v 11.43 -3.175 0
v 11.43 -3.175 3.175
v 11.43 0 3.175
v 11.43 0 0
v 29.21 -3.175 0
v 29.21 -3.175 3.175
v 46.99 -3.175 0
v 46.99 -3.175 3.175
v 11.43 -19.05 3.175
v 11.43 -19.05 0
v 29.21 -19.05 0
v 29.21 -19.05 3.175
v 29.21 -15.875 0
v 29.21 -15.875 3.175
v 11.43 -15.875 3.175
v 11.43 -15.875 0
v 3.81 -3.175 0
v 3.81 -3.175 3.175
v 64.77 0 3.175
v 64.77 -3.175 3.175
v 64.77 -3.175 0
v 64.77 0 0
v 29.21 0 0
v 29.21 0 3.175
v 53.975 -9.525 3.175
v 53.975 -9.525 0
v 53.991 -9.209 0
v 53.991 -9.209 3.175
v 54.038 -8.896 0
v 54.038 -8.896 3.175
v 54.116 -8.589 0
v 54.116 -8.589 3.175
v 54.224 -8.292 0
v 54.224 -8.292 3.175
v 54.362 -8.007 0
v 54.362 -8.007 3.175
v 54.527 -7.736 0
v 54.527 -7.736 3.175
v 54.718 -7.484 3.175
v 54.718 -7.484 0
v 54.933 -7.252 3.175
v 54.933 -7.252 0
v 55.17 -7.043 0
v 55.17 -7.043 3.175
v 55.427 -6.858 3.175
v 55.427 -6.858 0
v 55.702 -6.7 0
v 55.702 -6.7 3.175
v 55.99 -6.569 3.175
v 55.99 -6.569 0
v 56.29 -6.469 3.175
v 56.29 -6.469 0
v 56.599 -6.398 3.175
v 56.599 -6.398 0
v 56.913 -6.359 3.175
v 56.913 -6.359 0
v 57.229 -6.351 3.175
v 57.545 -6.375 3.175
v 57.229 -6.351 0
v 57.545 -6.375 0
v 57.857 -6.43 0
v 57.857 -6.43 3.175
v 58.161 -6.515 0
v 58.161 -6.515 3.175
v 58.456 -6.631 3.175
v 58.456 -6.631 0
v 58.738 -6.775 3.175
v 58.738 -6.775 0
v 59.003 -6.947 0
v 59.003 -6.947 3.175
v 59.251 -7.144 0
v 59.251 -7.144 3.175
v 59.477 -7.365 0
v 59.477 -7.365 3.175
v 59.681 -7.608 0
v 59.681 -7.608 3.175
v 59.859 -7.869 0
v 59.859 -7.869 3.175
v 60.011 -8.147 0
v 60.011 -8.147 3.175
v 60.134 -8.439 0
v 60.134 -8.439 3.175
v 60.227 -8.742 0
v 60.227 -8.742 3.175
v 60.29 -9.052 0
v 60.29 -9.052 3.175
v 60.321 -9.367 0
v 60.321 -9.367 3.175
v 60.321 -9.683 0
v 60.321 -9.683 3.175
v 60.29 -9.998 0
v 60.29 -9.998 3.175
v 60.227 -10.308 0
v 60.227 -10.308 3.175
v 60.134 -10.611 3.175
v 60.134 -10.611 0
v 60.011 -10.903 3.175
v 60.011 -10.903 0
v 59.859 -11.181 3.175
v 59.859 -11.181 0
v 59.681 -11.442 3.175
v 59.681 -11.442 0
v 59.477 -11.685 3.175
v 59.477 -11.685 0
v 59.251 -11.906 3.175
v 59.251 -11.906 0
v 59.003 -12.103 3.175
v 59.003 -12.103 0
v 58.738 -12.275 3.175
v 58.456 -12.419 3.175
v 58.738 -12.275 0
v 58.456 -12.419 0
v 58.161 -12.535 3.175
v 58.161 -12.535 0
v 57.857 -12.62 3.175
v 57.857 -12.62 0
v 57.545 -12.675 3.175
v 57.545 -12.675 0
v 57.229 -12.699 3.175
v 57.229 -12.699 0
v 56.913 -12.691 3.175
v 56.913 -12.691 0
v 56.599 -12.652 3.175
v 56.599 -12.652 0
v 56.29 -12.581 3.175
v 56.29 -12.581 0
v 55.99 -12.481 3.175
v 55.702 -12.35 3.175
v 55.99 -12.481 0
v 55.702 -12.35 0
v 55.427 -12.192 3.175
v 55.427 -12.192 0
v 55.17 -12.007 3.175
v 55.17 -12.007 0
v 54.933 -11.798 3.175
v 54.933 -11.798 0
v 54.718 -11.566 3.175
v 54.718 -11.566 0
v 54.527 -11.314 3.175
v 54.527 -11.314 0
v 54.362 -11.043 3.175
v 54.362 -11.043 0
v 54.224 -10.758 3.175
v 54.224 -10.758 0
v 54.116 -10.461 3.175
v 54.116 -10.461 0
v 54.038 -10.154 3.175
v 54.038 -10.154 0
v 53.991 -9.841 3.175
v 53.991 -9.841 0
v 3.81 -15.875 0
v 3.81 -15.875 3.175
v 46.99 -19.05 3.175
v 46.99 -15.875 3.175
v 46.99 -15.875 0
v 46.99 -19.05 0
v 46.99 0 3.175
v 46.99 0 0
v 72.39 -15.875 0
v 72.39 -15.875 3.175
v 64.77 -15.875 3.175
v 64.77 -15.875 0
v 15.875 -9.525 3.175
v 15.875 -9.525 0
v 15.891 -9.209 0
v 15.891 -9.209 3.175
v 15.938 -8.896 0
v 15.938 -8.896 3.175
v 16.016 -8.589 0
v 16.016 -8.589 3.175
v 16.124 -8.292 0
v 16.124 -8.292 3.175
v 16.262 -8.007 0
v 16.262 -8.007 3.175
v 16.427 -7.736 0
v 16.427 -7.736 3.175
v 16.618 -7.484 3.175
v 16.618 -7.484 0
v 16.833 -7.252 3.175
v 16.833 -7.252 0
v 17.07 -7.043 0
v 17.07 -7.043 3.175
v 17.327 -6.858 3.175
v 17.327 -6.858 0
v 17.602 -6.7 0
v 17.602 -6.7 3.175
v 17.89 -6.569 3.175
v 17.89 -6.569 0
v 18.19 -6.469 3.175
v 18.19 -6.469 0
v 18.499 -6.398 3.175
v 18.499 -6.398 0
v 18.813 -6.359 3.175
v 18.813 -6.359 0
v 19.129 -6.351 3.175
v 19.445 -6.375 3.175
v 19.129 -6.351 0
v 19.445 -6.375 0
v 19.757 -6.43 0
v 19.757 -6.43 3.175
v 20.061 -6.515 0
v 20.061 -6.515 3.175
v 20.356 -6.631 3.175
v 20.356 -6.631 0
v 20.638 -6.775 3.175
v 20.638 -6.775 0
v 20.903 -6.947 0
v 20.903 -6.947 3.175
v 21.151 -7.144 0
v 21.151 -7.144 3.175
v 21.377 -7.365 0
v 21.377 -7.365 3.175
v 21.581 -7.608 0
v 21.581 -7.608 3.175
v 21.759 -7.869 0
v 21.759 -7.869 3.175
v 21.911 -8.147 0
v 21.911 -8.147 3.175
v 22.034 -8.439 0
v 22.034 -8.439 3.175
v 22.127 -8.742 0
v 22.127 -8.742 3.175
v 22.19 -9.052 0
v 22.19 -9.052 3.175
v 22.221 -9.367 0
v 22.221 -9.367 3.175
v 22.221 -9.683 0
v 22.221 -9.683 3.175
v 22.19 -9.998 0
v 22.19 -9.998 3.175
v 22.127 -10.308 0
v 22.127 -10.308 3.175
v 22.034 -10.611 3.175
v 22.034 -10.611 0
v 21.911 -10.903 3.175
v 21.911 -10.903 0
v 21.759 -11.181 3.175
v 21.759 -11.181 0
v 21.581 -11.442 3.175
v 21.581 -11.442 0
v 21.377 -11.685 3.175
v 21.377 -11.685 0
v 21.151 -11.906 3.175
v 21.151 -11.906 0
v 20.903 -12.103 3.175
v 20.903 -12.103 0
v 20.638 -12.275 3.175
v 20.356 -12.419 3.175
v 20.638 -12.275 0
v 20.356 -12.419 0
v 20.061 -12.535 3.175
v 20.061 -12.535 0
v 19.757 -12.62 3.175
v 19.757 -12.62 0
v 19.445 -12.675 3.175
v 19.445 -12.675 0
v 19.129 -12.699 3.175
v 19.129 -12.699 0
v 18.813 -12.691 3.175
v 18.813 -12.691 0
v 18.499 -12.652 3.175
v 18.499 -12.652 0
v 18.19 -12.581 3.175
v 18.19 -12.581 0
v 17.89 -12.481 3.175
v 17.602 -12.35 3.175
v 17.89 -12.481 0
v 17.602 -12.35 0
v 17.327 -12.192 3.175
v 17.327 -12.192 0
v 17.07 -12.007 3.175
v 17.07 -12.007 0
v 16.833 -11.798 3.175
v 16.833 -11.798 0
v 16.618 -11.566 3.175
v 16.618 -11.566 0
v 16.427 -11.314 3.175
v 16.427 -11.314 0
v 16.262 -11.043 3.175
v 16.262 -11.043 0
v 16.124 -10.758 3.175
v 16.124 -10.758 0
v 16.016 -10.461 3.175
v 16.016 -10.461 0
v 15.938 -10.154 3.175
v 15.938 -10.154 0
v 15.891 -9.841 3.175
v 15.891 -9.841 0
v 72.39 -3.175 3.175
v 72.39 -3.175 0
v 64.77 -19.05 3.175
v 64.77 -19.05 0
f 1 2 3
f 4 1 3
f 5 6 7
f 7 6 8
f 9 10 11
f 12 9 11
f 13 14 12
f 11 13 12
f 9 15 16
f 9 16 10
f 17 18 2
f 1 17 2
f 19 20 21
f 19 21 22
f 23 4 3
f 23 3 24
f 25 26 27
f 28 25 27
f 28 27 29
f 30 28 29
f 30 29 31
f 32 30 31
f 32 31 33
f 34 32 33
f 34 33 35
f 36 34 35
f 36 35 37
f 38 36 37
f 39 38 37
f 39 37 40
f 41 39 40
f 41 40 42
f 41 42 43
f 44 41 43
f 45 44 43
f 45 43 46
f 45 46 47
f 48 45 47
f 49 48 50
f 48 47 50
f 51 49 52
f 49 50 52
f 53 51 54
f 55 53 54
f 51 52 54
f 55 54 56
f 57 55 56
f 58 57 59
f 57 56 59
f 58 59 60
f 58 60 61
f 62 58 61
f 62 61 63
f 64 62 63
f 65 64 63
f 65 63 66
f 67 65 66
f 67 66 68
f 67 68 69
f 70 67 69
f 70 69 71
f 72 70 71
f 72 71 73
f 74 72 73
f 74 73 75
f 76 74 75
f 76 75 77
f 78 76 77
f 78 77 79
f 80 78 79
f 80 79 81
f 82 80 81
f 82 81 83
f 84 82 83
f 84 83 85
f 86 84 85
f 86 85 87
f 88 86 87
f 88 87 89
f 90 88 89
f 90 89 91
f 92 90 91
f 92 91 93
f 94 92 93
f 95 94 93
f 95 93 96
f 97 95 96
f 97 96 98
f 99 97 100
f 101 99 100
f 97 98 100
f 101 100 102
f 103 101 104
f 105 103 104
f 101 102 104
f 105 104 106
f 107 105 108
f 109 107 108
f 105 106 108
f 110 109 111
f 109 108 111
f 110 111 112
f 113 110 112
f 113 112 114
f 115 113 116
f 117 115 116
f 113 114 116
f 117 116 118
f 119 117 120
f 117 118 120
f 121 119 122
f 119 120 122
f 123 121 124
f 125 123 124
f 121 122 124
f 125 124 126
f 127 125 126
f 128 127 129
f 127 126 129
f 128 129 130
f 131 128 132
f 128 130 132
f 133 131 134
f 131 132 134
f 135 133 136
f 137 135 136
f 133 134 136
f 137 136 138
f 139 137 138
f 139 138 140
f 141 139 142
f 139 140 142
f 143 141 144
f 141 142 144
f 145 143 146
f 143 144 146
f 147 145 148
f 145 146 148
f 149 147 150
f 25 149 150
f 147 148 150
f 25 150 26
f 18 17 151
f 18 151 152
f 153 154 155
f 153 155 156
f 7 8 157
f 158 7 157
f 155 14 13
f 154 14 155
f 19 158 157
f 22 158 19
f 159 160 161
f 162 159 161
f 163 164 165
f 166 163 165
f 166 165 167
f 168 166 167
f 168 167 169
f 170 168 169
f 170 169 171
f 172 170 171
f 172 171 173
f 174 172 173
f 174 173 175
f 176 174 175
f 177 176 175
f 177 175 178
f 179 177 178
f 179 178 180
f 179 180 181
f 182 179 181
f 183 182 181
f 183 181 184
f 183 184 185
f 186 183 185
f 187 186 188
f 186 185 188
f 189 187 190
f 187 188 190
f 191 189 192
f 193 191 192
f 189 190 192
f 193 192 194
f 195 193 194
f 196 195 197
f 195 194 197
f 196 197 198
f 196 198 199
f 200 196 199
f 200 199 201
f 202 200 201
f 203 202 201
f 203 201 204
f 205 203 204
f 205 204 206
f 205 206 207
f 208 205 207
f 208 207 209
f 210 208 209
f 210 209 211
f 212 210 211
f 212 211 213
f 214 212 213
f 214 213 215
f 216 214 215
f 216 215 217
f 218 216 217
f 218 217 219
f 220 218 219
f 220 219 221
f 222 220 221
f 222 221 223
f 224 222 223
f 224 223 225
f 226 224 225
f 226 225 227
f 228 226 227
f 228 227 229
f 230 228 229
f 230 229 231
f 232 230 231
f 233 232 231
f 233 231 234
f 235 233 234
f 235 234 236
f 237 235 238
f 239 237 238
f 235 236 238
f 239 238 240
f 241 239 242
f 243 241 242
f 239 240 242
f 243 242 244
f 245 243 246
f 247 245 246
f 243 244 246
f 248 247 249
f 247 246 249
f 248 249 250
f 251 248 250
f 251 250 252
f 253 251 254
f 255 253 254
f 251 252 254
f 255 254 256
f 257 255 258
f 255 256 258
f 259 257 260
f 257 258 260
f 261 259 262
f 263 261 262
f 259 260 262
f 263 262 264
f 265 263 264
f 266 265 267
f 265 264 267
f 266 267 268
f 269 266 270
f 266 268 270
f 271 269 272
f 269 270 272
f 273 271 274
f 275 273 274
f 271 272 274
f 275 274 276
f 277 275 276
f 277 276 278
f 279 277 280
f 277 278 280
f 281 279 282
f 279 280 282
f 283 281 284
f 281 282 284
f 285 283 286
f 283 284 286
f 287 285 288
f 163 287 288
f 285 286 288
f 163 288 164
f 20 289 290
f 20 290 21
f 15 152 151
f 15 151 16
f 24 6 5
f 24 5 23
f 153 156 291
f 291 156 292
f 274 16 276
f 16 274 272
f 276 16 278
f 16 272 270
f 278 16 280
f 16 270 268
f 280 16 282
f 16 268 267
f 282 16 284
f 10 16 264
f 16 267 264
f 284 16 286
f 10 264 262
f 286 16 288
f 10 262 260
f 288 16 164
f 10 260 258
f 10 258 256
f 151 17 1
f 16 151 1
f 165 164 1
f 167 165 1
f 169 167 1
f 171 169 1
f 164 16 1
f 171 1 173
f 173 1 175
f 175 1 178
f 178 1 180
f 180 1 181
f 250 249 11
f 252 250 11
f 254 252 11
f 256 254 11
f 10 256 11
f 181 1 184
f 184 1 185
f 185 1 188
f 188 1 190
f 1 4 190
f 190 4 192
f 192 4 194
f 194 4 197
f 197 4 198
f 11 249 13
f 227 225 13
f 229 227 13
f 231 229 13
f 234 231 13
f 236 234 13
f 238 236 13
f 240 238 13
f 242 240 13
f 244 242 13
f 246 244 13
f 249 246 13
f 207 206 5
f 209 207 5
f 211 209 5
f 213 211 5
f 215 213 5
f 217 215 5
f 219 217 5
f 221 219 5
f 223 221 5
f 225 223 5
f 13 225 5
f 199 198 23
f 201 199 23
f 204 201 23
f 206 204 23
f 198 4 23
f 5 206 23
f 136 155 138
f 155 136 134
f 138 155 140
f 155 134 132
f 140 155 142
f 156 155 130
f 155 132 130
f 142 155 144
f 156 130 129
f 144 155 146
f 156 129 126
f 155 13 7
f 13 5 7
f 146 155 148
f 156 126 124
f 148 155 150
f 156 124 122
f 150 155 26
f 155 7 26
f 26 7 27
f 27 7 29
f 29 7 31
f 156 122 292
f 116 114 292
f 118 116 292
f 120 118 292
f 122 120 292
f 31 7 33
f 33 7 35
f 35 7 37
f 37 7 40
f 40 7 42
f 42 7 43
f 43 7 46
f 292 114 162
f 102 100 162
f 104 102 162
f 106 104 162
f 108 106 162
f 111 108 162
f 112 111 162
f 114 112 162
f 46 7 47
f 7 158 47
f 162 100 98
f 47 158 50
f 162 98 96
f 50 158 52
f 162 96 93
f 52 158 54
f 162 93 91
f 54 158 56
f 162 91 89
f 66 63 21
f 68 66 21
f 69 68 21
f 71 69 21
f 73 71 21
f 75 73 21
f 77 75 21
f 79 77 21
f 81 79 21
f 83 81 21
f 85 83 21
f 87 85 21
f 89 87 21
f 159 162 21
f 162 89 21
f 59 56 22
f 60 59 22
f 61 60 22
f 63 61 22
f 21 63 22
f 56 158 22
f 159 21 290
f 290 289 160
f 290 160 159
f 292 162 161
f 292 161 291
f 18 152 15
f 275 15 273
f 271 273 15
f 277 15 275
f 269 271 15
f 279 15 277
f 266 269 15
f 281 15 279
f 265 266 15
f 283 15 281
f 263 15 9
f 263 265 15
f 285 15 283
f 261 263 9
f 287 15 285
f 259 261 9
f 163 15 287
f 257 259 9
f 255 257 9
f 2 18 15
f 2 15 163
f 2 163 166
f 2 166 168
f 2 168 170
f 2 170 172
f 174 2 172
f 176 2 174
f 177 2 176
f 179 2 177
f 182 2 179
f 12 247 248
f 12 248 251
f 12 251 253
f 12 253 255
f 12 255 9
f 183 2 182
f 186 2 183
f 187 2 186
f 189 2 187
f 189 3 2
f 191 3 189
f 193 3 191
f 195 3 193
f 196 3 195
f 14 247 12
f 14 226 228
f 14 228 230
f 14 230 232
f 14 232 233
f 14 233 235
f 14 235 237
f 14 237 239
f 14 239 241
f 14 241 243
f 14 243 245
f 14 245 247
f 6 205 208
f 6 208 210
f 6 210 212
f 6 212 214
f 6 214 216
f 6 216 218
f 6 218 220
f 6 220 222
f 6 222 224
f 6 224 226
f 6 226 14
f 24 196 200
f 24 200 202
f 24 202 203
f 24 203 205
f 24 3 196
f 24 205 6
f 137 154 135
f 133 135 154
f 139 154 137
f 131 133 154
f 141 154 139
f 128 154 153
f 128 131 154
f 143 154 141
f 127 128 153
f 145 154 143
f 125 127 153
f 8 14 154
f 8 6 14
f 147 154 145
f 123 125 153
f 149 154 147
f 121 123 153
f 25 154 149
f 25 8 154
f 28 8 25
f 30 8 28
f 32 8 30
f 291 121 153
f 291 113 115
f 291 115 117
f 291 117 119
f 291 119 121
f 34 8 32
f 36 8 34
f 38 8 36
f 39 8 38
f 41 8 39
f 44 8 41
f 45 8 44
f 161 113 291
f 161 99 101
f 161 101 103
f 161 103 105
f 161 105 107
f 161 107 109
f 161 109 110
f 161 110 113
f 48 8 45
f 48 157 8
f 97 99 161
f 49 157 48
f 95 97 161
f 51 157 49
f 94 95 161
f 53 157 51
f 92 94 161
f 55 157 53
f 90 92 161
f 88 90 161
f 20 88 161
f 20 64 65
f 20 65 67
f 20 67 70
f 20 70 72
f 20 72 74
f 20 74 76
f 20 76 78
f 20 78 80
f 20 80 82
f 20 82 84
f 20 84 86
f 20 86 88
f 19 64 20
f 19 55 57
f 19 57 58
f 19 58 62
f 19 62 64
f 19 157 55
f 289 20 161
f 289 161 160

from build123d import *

# Parameters (mm, degrees)
SKETCH1_W               = 76.2
SKETCH1_H               = 19.05
BOSS_EXTRUDE1_DEPTH     = 3.175
SKETCH2_W               = 11.43
SKETCH2_H               = 3.175
CUT_EXTRUDE1_DEPTH      = 79.60930686
SKETCH3_W               = 17.78
SKETCH3_H               = 3.175
CUT_EXTRUDE2_DEPTH      = 79.60930686
MIRROR2_COPY_1_SKETCH_W = 11.43
MIRROR2_COPY_1_SKETCH_H = 3.175
MIRROR2_COPY_1_DEPTH    = 79.60930686
HOLE1_D                 = 6.35
SKETCH6_W               = 3.175
SKETCH6_H               = 12.7
CUT_EXTRUDE3_DEPTH      = 3.81
SKETCH7_W               = 3.175
SKETCH7_H               = 12.7
CUT_EXTRUDE4_DEPTH      = 3.81


with BuildPart() as part:
    # Sketch1 → Boss-Extrude1 (new body)
    with BuildSketch(Plane.XY):
        with Locations((38.1, -9.525)):
            Rectangle(SKETCH1_W, SKETCH1_H)
    extrude(amount=BOSS_EXTRUDE1_DEPTH)

    # Sketch2 → Cut-Extrude1 (cut, through all)
    with BuildSketch(Plane.XY.offset(3.175)):
        with Locations((5.715, -1.5875)):
            Rectangle(SKETCH2_W, SKETCH2_H)
    cut_extrude1 = extrude(amount=-CUT_EXTRUDE1_DEPTH, mode=Mode.SUBTRACT)

    # Mirror1: Cut-Extrude1 across plane
    add(cut_extrude1.mirror(Plane(origin=(38.1, 0, 0), x_dir=(0, 0, 1), z_dir=(1, 0, 0))), mode=Mode.SUBTRACT)

    # Sketch3 → Cut-Extrude2 (cut, through all)
    with BuildSketch(Plane.XY.offset(3.175)):
        with Locations((38.1, -1.5875)):
            Rectangle(SKETCH3_W, SKETCH3_H)
    cut_extrude2 = extrude(amount=-CUT_EXTRUDE2_DEPTH, mode=Mode.SUBTRACT)

    # Mirror2: Cut-Extrude1, Cut-Extrude2 across plane
    add(cut_extrude1.mirror(Plane.ZX.offset(-9.525)), mode=Mode.SUBTRACT)
    add(cut_extrude2.mirror(Plane.ZX.offset(-9.525)), mode=Mode.SUBTRACT)

    # Mirror2 copy 1 sketch → Mirror2 copy 1 (cut, through all)
    with BuildSketch(Plane(origin=(76.2, -19.05, 3.175), x_dir=(-1, 0, 0), z_dir=(0, 0, 1))):
        with Locations((5.715, -1.5875)):
            Rectangle(MIRROR2_COPY_1_SKETCH_W, MIRROR2_COPY_1_SKETCH_H)
    extrude(amount=-MIRROR2_COPY_1_DEPTH, mode=Mode.SUBTRACT)

    # Hole1 (through all)
    with Locations(Plane.XY.offset(3.175)):
        with Locations((19.05, -9.525), (57.15, -9.525)):
            Hole(HOLE1_D / 2)

    # Sketch6 → Cut-Extrude3 (cut)
    with BuildSketch(Plane.ZY):
        with Locations((1.5875, -9.525)):
            Rectangle(SKETCH6_W, SKETCH6_H)
    extrude(amount=-CUT_EXTRUDE3_DEPTH, mode=Mode.SUBTRACT)

    # Sketch7 → Cut-Extrude4 (cut)
    with BuildSketch(Plane(origin=(76.2, 0, 0), x_dir=(0, 0, -1), z_dir=(1, 0, 0))):
        with Locations((-1.5875, -9.525)):
            Rectangle(SKETCH7_W, SKETCH7_H)
    extrude(amount=-CUT_EXTRUDE4_DEPTH, mode=Mode.SUBTRACT)


solid = part.part
